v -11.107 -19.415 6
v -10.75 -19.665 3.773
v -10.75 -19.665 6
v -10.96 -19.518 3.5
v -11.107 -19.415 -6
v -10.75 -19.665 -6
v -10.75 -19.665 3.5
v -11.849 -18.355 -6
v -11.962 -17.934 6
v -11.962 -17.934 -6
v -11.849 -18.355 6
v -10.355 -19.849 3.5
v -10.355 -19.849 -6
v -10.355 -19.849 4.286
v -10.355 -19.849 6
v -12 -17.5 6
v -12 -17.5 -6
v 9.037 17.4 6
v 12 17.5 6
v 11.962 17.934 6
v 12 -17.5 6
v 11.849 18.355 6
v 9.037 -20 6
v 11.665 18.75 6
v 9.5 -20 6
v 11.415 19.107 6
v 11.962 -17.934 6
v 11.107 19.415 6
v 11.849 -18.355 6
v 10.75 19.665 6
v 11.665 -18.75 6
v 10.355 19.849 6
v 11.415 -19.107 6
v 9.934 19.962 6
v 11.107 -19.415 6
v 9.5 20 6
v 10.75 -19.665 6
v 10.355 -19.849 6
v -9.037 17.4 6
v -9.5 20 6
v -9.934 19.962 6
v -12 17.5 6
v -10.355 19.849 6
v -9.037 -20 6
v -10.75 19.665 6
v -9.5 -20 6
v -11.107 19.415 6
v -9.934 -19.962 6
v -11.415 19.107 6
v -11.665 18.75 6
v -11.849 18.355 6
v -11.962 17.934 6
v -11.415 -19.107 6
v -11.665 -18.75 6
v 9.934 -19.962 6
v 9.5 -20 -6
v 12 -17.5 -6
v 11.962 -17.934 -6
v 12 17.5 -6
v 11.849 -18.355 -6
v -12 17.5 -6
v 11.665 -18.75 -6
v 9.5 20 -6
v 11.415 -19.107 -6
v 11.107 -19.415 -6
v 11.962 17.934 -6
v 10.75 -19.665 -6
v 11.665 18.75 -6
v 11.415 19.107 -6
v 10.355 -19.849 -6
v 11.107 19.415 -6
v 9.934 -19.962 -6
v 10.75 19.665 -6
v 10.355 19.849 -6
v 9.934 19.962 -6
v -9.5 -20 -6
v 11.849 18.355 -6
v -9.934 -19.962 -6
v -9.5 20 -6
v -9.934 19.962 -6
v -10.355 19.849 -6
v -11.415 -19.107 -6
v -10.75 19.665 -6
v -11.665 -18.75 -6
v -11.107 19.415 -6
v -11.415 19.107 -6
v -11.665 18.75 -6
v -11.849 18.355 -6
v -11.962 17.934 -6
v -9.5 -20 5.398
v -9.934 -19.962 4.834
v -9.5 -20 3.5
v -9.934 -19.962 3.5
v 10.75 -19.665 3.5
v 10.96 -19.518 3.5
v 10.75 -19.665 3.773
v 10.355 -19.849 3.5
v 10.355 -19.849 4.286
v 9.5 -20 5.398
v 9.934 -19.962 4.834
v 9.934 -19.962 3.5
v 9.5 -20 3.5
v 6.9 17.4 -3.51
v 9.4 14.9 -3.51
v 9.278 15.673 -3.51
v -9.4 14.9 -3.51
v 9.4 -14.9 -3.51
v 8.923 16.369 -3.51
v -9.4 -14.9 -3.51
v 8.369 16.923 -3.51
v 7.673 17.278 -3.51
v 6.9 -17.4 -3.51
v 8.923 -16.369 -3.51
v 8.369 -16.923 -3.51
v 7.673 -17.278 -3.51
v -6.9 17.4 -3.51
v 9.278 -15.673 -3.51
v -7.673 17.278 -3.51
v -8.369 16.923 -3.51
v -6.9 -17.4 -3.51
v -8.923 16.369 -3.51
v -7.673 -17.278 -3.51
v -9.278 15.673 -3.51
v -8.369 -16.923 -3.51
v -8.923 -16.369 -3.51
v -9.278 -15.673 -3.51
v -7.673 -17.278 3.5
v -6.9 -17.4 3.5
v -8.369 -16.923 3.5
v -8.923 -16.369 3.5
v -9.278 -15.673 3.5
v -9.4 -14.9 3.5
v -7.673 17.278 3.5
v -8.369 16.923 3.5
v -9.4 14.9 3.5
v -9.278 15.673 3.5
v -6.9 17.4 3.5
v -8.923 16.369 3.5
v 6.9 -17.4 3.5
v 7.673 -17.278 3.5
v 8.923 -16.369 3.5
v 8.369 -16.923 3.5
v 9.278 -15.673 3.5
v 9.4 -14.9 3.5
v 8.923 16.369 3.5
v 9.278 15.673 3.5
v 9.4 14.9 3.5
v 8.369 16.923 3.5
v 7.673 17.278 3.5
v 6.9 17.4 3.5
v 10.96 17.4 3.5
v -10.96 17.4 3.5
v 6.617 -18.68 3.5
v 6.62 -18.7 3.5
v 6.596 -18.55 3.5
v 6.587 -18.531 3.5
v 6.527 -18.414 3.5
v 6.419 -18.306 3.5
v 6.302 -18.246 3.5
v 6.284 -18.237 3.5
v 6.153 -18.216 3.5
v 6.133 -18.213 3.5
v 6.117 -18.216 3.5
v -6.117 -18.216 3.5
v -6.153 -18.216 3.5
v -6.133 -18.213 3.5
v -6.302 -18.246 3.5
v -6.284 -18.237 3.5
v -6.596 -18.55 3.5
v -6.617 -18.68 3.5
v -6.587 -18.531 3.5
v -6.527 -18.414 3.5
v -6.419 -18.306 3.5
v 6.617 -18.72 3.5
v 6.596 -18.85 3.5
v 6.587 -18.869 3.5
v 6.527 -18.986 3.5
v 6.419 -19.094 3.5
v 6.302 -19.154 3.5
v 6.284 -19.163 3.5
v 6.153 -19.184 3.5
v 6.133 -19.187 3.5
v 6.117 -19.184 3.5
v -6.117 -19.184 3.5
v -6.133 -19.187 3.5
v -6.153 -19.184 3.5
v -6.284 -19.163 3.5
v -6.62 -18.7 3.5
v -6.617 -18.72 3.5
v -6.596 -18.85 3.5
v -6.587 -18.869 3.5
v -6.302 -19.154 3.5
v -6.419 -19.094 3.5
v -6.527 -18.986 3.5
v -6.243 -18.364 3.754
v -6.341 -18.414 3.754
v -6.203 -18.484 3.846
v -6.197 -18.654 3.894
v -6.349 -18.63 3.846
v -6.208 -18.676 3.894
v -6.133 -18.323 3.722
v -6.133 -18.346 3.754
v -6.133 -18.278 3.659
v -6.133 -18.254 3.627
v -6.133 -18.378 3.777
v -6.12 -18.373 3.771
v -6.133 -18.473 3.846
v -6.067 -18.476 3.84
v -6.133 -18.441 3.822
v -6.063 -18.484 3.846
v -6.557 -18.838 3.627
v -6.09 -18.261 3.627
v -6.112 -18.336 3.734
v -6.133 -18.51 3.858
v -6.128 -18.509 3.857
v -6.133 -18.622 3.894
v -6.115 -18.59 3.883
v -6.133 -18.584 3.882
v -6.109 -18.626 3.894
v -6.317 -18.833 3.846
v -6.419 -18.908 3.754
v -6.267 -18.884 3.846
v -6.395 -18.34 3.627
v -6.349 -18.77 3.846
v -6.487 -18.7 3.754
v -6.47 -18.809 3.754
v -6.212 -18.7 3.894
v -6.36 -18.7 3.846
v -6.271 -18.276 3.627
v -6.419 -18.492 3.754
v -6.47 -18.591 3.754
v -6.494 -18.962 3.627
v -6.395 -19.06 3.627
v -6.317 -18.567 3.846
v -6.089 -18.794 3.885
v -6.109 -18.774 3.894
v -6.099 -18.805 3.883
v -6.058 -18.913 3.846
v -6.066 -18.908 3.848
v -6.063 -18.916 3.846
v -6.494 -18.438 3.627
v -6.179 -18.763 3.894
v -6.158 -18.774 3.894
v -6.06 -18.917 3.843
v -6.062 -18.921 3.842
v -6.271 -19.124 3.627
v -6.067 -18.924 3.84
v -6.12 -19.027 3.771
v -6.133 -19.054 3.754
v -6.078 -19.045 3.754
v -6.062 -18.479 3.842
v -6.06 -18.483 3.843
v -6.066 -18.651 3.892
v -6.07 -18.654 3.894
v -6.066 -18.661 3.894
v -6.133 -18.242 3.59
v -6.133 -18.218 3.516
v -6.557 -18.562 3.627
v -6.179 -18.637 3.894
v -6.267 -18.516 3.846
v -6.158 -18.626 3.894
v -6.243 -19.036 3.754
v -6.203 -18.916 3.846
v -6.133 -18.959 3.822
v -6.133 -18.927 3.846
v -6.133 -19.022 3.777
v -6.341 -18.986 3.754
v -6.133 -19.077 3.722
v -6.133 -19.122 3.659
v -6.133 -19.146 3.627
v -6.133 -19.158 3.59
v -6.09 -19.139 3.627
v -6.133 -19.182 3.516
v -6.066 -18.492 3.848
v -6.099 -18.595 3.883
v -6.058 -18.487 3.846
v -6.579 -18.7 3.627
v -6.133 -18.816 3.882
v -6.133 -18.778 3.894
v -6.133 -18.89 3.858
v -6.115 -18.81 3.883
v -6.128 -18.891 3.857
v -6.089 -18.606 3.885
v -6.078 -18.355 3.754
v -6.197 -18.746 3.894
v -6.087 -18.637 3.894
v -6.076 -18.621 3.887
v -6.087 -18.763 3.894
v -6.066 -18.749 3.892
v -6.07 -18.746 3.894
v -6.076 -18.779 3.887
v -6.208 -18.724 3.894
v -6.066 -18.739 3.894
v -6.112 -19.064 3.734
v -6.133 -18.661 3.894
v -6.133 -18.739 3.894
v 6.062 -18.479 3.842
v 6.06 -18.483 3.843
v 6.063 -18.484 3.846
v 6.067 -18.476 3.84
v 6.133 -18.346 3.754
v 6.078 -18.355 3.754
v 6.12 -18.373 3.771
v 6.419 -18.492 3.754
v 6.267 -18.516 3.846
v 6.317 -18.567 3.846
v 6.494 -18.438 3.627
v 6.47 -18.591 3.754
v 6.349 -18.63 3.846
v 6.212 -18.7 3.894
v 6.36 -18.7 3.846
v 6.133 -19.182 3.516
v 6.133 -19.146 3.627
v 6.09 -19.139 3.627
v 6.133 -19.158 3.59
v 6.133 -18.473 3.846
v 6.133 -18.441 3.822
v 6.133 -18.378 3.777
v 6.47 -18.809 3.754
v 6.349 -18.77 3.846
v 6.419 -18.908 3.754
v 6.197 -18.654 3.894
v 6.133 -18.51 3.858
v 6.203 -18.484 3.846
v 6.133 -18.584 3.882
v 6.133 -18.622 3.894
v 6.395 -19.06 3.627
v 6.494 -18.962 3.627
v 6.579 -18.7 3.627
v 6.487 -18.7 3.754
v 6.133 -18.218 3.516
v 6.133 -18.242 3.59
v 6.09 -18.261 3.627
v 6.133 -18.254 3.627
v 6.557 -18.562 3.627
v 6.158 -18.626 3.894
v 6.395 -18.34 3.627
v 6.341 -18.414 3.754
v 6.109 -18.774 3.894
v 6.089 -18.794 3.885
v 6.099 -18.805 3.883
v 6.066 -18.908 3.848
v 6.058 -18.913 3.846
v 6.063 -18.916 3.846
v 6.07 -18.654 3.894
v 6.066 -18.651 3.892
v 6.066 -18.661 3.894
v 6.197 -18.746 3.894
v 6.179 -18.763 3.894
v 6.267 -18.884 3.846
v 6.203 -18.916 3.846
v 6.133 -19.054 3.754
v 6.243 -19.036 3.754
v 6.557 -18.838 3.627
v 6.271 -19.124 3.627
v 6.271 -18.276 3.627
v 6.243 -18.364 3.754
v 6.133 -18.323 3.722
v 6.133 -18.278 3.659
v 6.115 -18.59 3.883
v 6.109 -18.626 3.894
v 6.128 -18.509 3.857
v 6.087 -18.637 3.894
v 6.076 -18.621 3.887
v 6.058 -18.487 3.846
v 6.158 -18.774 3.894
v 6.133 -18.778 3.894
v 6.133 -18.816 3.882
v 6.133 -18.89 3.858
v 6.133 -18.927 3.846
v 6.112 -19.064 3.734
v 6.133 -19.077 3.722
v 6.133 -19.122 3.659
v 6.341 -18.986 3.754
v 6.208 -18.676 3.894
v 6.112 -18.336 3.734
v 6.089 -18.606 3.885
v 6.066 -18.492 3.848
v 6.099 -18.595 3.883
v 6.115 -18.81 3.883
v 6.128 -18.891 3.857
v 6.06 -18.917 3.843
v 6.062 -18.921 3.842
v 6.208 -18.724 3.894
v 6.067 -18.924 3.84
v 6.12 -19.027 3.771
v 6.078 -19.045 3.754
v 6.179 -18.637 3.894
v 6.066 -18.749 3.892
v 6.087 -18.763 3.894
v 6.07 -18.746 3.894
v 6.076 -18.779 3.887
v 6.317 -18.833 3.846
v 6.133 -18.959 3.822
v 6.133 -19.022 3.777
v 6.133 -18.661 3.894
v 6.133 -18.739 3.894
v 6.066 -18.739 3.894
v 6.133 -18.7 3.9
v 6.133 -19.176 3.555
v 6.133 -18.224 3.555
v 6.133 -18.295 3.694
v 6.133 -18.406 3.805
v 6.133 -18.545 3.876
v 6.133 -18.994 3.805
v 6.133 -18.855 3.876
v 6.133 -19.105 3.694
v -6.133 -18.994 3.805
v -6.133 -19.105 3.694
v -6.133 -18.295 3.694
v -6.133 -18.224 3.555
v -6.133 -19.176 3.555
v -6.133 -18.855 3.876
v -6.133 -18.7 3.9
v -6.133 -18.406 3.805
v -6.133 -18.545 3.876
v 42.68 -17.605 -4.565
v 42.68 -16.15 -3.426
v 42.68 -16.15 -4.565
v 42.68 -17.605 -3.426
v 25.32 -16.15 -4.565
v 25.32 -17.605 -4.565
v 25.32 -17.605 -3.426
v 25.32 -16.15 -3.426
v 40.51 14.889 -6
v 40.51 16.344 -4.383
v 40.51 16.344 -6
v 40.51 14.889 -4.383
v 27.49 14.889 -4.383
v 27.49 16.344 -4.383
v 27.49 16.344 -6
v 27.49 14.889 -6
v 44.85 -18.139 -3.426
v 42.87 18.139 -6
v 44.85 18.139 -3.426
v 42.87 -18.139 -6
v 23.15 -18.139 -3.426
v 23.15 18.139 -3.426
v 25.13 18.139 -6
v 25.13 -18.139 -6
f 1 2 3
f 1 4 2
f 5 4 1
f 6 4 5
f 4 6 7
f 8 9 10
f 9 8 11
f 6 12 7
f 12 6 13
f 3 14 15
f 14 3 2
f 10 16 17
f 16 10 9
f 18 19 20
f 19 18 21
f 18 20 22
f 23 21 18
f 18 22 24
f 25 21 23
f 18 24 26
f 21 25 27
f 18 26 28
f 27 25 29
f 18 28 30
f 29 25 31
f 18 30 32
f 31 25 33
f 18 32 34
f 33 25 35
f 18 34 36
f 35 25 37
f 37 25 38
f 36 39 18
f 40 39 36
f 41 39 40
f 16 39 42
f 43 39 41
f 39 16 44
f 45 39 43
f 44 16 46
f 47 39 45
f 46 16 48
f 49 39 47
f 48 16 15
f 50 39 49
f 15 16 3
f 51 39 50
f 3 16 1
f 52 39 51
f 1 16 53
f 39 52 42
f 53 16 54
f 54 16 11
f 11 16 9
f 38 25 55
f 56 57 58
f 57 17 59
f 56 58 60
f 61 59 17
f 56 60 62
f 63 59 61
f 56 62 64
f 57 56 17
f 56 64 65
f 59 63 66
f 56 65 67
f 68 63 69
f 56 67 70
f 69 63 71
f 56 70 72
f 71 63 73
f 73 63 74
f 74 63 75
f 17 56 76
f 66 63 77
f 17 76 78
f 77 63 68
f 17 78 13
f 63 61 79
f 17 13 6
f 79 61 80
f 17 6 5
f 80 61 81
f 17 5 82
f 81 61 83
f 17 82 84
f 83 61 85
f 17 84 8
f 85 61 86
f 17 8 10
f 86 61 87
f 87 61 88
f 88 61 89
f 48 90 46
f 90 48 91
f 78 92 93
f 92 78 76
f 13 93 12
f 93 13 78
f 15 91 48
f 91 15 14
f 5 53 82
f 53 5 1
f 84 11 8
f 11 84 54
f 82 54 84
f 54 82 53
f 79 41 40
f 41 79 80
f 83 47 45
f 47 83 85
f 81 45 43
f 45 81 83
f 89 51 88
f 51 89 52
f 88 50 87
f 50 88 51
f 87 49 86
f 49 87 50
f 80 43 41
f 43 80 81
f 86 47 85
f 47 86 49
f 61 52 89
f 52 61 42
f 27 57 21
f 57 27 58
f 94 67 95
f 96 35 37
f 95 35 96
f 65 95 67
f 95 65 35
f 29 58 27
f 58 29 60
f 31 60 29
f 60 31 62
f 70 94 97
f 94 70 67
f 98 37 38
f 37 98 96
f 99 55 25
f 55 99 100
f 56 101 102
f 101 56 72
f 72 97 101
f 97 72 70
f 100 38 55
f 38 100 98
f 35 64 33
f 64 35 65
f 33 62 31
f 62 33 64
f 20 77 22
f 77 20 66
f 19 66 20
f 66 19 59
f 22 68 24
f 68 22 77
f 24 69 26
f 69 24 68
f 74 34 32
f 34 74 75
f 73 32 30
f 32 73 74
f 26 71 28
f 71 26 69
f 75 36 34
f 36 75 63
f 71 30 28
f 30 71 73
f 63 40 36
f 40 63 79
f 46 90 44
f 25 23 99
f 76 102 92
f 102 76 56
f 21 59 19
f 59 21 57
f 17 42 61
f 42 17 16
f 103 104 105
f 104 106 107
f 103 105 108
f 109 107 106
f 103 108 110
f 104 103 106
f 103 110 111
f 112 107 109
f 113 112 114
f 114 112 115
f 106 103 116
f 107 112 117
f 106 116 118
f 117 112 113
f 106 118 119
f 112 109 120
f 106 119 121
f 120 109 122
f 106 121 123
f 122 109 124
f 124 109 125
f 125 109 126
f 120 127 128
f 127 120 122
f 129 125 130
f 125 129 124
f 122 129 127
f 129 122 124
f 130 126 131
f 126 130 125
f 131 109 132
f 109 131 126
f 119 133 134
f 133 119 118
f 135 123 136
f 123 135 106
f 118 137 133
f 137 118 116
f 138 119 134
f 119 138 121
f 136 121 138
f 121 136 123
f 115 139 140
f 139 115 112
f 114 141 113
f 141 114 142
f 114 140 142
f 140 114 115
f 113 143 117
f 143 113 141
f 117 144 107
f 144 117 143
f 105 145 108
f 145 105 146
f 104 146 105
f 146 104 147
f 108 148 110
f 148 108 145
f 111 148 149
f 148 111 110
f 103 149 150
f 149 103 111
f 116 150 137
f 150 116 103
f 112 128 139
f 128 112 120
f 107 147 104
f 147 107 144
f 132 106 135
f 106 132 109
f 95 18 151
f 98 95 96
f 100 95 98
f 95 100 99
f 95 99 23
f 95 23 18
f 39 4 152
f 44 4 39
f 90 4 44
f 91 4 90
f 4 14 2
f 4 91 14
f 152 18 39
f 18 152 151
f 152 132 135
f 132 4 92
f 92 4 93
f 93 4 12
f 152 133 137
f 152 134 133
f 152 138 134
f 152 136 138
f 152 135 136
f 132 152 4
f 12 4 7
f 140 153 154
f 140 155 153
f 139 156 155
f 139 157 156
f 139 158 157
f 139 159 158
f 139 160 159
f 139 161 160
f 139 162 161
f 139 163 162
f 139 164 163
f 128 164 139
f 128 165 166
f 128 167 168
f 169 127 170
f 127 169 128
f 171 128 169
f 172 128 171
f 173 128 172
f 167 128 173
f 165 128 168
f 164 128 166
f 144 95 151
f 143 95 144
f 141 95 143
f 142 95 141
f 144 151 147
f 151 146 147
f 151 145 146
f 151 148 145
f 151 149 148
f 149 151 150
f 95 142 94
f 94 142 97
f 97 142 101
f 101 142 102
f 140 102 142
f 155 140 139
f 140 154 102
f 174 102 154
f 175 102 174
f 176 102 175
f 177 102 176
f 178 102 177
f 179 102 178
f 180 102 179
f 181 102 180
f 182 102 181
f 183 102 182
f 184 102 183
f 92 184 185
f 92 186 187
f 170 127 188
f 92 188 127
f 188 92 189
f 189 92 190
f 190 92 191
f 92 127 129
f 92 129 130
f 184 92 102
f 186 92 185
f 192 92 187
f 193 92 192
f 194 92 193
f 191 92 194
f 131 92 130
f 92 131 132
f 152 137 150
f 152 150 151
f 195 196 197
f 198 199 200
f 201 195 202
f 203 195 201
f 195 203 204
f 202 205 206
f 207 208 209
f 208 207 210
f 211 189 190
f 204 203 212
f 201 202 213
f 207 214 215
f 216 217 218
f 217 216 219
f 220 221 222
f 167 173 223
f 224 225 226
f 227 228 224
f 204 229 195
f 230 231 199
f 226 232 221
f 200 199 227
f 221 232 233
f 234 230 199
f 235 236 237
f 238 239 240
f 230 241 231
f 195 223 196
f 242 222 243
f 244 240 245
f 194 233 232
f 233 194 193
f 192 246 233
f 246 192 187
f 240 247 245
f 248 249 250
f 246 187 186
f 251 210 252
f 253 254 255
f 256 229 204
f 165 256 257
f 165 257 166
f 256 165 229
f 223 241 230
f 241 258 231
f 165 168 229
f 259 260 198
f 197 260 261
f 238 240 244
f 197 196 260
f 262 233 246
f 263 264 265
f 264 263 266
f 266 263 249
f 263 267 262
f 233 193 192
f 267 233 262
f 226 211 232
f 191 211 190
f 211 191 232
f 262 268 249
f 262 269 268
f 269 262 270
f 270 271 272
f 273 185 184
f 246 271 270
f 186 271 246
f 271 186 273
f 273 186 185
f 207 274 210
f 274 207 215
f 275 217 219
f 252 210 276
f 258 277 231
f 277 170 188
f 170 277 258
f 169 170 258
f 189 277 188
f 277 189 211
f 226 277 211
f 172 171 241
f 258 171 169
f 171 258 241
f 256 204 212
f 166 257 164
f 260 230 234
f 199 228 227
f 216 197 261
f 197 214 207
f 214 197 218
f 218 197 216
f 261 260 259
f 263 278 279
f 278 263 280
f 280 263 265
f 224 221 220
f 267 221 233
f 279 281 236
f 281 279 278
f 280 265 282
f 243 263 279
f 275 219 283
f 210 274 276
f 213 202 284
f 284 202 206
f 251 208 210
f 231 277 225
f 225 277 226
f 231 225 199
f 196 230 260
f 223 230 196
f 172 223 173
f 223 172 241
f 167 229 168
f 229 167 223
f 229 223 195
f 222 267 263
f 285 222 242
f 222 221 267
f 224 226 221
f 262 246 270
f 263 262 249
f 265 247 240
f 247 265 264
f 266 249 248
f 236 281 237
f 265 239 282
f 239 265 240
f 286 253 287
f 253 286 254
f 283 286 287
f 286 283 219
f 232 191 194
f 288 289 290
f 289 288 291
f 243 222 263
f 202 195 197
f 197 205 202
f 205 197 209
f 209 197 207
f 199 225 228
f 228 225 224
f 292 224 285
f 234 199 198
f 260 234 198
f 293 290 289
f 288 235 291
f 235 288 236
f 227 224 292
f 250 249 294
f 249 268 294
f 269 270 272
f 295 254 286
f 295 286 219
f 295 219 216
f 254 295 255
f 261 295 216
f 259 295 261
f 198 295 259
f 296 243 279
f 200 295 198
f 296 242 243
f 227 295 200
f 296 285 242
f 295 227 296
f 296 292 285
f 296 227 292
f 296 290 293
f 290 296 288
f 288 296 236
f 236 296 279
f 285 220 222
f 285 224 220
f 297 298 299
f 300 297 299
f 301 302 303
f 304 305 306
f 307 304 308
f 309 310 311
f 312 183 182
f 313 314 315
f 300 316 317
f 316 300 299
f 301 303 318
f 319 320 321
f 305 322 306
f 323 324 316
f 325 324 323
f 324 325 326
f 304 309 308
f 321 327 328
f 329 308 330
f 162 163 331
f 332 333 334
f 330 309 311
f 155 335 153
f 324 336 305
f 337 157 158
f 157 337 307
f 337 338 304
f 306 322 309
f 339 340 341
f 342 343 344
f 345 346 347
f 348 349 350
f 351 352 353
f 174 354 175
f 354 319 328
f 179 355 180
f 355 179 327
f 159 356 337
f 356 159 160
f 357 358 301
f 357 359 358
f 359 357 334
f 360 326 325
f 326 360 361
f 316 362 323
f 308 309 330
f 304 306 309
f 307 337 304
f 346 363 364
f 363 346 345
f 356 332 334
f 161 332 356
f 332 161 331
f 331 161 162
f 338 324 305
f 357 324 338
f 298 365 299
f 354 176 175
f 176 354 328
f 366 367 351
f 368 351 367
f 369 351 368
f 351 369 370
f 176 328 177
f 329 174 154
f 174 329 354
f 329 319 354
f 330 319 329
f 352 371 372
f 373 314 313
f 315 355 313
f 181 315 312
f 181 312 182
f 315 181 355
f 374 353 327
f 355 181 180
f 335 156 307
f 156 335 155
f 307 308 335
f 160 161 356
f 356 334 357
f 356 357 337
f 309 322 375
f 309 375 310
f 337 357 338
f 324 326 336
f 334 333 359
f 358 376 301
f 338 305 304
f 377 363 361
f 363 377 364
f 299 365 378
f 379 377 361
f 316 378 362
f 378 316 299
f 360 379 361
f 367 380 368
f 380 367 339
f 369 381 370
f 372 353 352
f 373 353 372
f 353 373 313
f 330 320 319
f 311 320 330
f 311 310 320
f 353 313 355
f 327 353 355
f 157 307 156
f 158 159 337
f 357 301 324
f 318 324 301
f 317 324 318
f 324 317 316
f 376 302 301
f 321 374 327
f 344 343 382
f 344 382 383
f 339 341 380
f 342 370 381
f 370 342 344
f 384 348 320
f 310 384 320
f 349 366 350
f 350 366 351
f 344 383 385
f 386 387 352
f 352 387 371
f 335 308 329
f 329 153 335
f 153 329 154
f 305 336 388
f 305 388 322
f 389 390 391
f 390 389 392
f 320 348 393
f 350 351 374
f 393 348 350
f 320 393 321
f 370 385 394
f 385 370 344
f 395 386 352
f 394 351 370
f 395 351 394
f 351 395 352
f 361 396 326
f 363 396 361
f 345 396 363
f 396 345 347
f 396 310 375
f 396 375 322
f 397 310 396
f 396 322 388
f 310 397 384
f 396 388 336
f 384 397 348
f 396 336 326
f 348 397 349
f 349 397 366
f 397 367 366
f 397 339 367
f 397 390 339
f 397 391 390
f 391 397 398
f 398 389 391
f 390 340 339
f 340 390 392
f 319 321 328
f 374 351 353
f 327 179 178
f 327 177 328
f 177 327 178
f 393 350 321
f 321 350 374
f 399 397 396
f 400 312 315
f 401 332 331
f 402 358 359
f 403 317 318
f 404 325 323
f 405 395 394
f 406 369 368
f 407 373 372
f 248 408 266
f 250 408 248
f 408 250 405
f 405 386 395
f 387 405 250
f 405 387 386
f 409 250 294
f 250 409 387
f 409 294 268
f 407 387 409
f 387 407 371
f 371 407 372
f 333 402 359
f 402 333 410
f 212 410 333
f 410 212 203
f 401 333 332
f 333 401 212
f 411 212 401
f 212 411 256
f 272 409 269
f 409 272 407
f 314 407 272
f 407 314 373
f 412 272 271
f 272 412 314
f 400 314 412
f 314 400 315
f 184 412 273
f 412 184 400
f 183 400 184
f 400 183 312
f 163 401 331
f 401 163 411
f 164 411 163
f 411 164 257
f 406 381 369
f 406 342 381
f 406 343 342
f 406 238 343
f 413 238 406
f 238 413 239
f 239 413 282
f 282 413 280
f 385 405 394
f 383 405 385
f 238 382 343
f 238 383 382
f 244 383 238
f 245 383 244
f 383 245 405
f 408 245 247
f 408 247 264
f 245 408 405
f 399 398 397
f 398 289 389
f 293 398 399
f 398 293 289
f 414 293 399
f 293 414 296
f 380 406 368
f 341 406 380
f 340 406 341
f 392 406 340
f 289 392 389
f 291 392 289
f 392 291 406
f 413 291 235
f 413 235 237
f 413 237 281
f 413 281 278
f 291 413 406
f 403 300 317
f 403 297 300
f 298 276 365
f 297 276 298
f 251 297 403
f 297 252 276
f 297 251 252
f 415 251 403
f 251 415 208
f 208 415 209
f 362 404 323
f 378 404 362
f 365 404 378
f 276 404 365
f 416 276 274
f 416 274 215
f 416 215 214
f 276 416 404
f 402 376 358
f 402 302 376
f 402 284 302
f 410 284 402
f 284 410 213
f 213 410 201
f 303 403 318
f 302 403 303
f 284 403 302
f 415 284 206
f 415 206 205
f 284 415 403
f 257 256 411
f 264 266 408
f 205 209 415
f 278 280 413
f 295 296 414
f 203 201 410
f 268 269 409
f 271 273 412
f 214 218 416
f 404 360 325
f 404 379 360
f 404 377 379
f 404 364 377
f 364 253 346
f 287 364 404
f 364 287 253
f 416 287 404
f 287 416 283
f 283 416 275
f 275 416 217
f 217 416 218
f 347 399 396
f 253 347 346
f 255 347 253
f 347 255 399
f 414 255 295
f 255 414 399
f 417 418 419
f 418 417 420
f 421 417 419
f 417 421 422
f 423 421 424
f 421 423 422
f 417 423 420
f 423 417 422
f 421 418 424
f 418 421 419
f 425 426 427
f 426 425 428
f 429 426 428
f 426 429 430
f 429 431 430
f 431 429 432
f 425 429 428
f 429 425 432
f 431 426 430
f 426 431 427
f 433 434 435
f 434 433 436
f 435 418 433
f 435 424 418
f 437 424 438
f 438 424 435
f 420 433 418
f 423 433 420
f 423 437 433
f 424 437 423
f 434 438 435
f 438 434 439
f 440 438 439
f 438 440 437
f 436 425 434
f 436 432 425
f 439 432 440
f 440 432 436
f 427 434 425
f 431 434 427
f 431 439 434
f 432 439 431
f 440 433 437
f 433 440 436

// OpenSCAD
include <MCAD/boxes.scad>

//Pill box with sliding lid

/* [Box Dimensions] */
//Box Width (min: 5 x Wall Thickness)
bX=24; 
//Box Depth (min: 5 x Wall Thickness)
bY=40; 
//Box Height (min: 5 x Wall Thickness)
bZ=12;
//Corner Radius (radius of the corner fillet inside and outside)
corner=2.5; 

/* [Wall Thickness] */
//Wall Thickness (min: 2mm)
wall=2.6;

/* [Lid] */
//Lid Lip Width (min: 1mm)
lip=2;
//Snugness of Lid (values approaching 1.0 result in a snugger fit)
snug=.99; 

/* [Catch] */
//Catch Height (height over the lip for the catch)
catch=1;

/* [Hidden] */
boxDim=[bX, bY, bZ]; 

module drawBox () {
  innerBox=[bX-(2*wall), bY-(2*wall), bZ-(2*wall)+.22];
  echo("innerBox=", innerBox);
  difference() {
    roundedBox(boxDim, corner, sidesonly=1, $fn=36);
    roundedBox(innerBox, corner, sidesonly=1, $fn=20);
    translate([0, -wall, bZ/2+.1]) cutLid(0);
  }
}

module cutLid(shorten, catch) {
  //Create a trapezoid lid 

  insideLip=wall*1.2; //lip inside the box for the lid to rest upon
  lX=bX-(2*wall)+insideLip;
  lY=bY-shorten;

  echo("inside lip=", insideLip/2);

  p0=[0, 0];
  p1=[lX, 0];
  p2=[lX-lip, wall];
  p3=[lip, wall];

  // this needs to be less than 45 deg to be usable
  echo("Lip Overhang=", atan(lip/wall));
  
  difference() {
    rotate([90,0,0])
      translate([-lX/2, -wall, 0]) 
      linear_extrude(height=lY, center=true) polygon([p0, p1, p2, p3], paths=[[0,1,2,3]]);
    if (catch==1) {
      translate([0, lY/2-wall/2, -wall+catch/2]) cube([lX*.8, catch*1.5, catch*1.3], center=true);
      //Add an additional slot to make it easier to slide open the lid
      translate([0, -lY/2+wall, wall/3]) cube([lX*.6, catch*1.5, catch*5], center=true);
    } else {
      echo("catch=false");
    }

  }
}

module drawCatch() {
  rad=catch/2;
  lX=bX-2*(wall+.2);

  union() {
    translate([-lX/3, 0, 0]) sphere(r=rad, $fn=20);
    translate([ lX/3, 0, 0]) sphere(r=rad, $fn=20);
    rotate([0,90,0])cylinder(h=lX/1.5, r=rad, center=true, $fn=20);
  }
}

module assemble() {
    union() {
      drawBox();
      //move the catch to the front of the box
      translate([0, -(bY/2)+wall/2, bZ/2-wall]) drawCatch();
    }
  //draw the lid (wall, 1) - second paramater specifies to add a hole for a catch
  translate([bX+10, 0, (-bZ/2)]) rotate([180, 0, 0]) scale([snug, .97, snug]) cutLid(wall, 1);
}

assemble();
